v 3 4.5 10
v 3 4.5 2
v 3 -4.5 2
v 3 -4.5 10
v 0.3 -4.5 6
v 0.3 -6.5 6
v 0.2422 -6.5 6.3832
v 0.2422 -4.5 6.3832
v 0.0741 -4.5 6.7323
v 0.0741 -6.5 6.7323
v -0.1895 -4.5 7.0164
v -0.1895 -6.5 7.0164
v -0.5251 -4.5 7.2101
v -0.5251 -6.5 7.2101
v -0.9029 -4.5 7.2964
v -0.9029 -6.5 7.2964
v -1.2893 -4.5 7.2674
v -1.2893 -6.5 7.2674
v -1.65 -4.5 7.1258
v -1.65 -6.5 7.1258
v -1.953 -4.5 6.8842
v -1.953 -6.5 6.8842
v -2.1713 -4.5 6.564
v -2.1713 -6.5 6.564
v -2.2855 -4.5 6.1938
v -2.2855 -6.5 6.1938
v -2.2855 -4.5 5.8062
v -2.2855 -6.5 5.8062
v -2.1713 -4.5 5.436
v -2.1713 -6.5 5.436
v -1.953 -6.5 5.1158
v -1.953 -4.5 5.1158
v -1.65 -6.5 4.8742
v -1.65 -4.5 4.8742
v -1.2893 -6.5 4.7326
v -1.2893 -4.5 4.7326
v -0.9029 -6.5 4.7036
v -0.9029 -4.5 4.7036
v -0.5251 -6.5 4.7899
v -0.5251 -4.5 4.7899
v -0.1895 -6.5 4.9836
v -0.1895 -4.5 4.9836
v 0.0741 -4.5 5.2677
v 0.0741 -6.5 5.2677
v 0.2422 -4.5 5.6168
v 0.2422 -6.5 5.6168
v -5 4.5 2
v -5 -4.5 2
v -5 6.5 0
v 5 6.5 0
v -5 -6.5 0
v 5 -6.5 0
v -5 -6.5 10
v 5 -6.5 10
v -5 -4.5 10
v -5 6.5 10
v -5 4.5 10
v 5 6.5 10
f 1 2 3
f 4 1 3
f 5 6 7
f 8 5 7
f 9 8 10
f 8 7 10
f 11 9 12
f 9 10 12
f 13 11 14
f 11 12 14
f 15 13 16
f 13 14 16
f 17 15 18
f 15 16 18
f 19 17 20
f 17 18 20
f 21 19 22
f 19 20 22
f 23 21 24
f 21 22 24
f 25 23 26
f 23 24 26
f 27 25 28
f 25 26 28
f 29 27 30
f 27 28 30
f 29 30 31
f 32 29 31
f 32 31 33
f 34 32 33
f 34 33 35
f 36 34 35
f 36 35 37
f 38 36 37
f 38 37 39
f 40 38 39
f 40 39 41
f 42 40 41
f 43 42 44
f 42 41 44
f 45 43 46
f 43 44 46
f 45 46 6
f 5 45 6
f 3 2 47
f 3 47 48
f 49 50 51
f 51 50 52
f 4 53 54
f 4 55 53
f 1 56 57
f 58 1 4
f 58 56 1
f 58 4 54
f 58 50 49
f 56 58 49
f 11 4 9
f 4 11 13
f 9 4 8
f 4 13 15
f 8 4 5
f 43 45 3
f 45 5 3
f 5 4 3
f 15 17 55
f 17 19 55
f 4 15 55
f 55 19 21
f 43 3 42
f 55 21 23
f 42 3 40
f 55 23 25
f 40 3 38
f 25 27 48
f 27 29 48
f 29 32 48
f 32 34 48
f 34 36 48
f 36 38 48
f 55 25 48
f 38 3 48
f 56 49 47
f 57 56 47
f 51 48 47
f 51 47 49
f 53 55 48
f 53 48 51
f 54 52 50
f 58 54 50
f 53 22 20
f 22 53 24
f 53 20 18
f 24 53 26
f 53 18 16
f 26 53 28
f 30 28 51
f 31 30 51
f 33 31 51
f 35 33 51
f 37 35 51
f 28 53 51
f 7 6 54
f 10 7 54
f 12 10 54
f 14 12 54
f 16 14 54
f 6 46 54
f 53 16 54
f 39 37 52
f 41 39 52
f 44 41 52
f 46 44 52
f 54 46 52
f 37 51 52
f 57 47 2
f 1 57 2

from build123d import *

# Parameters (mm, degrees)
F1_DEPTH = 10
F2_W     = 9
F2_H     = 2
F3_DEPTH = 8
F4_R     = 1.3
F5_DEPTH = 2


# Not quite as in the source:
# - a feature names something its author has since deleted; it is built from what else it names


with BuildPart() as f1:
    # F0 (on Top) → F1 (new body)
    with BuildSketch(Plane.XY):
        Polygon((-5, -6.5), (5, -6.5), (5, 6.5), (-5, 6.5), (-5, 4.5), (-3, 4.5), (3, 4.5), (3, -4.5), (-3, -4.5), (-5, -4.5), align=None)
    extrude(amount=F1_DEPTH)

    # F2 (on face) → F3 (join)
    with BuildSketch(Plane(origin=(3, 0, 0), x_dir=(0, -1, 0), z_dir=(-1, 0, 0))):
        with Locations((0, 1)):
            Rectangle(F2_W, F2_H)
    extrude(amount=F3_DEPTH)

    # F4 (on face) → F5 (cut, through all)
    with BuildSketch(Plane.XZ.offset(6.5)):
        with Locations((-1, 6)):
            Circle(F4_R)
    extrude(amount=-F5_DEPTH, mode=Mode.SUBTRACT)


solid = f1.part
